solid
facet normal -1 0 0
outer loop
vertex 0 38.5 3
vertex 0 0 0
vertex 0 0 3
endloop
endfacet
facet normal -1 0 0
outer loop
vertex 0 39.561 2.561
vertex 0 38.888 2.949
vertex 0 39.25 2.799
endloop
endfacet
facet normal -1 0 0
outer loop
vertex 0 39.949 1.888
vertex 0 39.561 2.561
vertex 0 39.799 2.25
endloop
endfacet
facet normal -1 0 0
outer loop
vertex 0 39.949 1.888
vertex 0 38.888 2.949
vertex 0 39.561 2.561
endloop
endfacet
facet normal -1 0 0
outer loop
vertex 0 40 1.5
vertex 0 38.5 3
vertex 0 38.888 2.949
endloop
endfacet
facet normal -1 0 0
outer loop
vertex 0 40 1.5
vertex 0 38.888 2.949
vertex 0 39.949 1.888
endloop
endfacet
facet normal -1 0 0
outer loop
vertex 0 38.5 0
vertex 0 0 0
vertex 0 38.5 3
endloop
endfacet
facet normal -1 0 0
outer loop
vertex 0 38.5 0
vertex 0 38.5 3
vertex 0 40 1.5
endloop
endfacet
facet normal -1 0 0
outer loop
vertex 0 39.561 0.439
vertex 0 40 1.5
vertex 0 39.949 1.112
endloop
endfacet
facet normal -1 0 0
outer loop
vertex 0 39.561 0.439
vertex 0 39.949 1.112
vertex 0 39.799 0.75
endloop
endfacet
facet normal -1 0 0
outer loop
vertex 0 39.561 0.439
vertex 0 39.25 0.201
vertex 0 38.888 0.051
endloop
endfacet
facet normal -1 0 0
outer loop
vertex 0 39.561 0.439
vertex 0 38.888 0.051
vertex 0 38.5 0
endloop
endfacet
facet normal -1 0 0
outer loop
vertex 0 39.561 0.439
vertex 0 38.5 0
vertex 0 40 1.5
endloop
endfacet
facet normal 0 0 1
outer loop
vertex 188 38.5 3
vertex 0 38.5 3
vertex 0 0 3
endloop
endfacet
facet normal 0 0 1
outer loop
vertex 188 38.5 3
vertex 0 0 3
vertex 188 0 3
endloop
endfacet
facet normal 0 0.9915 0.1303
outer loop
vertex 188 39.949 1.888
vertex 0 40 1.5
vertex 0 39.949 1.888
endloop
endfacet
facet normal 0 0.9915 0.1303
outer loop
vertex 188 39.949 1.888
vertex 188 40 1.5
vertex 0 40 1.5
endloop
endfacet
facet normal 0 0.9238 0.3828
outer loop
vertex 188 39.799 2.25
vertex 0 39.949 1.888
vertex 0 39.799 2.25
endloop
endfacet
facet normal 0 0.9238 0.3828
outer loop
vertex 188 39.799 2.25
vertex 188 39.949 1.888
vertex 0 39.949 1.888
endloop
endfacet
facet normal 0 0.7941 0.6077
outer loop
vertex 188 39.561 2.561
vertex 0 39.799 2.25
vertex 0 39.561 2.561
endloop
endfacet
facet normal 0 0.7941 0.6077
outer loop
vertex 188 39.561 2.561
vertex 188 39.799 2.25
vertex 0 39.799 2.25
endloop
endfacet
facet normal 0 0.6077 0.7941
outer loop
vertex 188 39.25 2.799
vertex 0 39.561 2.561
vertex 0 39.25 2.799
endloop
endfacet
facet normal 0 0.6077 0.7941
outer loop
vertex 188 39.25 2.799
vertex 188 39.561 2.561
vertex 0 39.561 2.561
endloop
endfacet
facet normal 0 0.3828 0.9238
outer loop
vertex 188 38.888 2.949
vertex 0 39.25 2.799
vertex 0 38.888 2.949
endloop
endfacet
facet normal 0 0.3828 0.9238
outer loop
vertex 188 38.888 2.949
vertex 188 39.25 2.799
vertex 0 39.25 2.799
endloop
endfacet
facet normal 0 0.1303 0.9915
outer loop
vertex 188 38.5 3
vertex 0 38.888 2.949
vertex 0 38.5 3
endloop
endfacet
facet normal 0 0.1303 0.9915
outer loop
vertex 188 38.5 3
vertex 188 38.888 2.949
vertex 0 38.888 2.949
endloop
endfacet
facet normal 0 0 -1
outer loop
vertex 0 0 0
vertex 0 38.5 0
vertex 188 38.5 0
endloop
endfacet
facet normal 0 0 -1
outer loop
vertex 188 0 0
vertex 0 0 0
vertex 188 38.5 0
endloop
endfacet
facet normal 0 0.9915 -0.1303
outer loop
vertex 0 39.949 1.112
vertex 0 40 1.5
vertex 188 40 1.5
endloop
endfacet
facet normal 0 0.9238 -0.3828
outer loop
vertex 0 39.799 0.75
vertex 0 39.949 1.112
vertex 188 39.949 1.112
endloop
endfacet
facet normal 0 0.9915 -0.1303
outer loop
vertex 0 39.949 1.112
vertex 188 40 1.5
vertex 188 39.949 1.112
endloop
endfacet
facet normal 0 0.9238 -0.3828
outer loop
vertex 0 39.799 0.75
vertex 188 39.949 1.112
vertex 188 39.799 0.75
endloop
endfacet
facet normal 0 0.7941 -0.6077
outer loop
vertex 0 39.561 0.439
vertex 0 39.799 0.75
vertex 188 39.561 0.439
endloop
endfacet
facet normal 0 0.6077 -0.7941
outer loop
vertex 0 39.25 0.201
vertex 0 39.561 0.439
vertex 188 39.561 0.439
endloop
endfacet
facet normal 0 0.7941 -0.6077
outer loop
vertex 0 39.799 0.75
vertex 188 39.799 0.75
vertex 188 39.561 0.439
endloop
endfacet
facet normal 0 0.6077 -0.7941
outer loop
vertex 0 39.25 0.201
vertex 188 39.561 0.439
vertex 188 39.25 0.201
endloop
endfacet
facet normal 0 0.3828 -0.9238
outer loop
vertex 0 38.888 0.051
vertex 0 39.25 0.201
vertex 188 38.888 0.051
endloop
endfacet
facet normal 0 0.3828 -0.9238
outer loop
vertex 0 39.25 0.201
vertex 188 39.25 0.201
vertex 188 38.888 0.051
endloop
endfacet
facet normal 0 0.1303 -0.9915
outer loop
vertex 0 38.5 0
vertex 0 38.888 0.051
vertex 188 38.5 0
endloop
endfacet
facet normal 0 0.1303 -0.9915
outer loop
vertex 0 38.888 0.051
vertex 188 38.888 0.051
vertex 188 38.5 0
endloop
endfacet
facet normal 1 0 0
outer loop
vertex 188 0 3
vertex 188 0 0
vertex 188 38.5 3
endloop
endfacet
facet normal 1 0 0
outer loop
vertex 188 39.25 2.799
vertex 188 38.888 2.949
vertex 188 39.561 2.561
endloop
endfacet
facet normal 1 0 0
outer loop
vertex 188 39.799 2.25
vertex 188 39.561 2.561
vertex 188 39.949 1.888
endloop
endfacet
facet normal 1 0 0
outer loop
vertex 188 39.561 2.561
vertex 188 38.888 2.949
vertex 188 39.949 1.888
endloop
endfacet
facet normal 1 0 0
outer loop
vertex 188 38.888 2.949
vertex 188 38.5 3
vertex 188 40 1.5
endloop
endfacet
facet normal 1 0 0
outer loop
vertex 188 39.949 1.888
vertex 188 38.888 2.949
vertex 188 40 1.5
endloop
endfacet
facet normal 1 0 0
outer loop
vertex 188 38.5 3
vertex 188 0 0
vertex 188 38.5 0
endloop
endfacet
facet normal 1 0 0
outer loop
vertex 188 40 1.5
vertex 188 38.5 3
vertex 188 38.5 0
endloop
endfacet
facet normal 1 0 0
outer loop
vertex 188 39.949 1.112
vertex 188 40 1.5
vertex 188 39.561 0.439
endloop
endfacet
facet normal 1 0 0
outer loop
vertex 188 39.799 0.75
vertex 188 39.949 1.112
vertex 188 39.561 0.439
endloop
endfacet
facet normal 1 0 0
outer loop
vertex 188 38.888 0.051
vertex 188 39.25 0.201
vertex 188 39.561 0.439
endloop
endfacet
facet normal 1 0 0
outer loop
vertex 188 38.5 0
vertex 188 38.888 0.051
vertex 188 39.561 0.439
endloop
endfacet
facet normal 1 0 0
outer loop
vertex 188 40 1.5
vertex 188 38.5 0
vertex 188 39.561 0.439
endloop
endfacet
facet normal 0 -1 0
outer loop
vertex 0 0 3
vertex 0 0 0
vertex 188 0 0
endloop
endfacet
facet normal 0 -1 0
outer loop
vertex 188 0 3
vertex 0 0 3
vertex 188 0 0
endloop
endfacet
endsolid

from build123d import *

# Parameters (mm, degrees)
ESQUISSE1_W        = 188
ESQUISSE1_H        = 40
BOSS_EXTRU_1_DEPTH = 3
CONG_1_R           = 1.5
CONG_3_R           = 1.5


with BuildPart() as part:
    # Esquisse1 → Boss.-Extru.1 (new body)
    with BuildSketch(Plane.XY):
        with Locations((94, 20)):
            Rectangle(ESQUISSE1_W, ESQUISSE1_H)
    extrude(amount=BOSS_EXTRU_1_DEPTH)

    # Congé1
    cong_1_edges = [part.edges().sort_by_distance(p)[0] for p in [
        (94, 40, 3),
    ]]
    fillet(cong_1_edges, radius=CONG_1_R)

    # Congé3
    cong_3_edges = [part.edges().sort_by_distance(p)[0] for p in [
        (94, 40, 0),
    ]]
    fillet(cong_3_edges, radius=CONG_3_R - 0.0001)  # a hair under: the kernel refuses the full size


solid = part.part
